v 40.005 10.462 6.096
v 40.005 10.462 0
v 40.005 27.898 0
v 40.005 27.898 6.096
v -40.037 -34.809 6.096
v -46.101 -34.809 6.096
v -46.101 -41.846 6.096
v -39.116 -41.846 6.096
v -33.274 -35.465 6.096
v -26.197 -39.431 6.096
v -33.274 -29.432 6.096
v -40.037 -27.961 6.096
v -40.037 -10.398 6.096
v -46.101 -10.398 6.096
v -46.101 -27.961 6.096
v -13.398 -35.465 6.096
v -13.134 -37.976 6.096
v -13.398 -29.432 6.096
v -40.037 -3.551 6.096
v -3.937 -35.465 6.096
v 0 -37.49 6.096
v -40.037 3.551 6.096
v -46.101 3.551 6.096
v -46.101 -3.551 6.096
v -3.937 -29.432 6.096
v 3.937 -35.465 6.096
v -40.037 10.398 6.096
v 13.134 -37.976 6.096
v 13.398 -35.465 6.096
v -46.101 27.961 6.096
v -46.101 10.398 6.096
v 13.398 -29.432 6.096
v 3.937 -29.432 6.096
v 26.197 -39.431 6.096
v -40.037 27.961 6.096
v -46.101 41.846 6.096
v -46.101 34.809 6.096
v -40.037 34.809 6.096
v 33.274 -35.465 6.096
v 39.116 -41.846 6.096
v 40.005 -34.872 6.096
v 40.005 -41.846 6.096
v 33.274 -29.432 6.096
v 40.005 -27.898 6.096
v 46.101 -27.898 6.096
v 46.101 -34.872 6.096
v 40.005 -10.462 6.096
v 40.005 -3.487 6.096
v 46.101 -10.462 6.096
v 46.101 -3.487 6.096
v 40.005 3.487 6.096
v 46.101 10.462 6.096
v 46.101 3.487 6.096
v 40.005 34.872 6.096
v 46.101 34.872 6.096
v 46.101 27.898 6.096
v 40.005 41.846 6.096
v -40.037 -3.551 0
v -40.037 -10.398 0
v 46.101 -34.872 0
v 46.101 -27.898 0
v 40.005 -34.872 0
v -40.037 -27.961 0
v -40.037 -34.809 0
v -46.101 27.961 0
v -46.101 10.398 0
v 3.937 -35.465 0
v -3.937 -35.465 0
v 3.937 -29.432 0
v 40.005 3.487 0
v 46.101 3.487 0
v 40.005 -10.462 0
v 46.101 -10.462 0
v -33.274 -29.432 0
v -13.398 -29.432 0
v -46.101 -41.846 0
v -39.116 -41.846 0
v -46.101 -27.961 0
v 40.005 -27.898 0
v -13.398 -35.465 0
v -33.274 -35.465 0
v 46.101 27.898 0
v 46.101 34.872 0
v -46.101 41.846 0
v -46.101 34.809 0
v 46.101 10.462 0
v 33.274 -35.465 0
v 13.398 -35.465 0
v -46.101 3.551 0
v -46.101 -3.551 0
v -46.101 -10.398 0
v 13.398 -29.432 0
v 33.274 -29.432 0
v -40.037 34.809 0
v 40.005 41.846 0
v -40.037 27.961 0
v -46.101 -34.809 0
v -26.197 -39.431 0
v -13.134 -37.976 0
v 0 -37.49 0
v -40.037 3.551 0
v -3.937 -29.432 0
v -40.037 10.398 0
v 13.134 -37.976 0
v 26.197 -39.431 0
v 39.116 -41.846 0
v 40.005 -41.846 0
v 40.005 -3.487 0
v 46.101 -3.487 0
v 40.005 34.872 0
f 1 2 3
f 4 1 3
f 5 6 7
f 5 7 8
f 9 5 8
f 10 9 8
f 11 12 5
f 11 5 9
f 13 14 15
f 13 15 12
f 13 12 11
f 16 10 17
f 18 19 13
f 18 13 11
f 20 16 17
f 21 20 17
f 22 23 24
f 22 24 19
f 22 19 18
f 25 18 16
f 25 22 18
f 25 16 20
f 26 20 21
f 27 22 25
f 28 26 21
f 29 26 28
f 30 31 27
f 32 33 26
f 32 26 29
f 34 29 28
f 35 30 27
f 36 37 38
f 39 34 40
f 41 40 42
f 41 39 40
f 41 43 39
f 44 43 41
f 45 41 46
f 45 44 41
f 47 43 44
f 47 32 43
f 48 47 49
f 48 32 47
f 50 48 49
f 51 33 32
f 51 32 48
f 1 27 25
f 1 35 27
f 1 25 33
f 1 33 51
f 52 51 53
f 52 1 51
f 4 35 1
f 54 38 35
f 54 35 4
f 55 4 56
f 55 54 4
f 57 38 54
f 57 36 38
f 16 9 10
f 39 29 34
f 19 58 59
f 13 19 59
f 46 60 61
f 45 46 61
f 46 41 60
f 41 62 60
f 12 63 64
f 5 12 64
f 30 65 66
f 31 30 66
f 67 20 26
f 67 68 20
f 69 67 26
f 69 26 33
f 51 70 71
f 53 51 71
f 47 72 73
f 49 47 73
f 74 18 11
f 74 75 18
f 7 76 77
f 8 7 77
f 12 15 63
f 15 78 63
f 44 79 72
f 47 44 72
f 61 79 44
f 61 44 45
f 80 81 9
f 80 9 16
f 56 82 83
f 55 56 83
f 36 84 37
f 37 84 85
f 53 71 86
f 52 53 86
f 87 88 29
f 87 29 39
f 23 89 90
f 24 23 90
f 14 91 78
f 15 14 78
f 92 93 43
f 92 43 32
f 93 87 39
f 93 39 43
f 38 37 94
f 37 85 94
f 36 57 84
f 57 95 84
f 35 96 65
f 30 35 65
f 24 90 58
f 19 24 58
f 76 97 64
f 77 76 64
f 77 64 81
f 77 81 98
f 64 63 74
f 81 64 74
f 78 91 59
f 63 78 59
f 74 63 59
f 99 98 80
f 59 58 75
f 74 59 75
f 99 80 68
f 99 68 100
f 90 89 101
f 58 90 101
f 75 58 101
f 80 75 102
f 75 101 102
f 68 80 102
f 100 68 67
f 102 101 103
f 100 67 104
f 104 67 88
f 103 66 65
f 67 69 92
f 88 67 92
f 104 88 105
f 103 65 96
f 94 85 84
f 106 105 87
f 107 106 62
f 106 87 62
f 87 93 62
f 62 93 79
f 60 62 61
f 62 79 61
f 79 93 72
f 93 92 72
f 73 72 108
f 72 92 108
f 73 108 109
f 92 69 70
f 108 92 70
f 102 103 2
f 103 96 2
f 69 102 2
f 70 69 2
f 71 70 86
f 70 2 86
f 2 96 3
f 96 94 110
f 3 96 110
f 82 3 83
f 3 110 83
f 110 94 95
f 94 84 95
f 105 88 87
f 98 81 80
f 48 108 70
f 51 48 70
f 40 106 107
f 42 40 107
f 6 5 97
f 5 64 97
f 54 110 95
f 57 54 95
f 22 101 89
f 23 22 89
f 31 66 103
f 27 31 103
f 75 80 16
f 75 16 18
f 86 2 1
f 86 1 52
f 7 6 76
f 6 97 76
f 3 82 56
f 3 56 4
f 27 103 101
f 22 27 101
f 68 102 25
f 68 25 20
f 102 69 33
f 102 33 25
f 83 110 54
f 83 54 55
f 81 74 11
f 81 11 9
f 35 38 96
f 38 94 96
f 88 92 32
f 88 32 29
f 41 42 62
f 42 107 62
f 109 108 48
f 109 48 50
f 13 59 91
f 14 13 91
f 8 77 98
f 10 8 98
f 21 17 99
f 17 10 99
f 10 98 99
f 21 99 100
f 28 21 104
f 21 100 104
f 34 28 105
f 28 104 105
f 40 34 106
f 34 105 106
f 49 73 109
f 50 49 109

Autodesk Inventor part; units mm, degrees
ref_plane "YZ Plane" through (0, 0, 0) normal (1, 0, 0) x (0, 1, 0)
ref_plane "XZ Plane" through (0, 0, 0) normal (0, 1, 0) x (-1, 0, 0)
ref_plane "XY Plane" through (0, 0, 0) normal (0, 0, 1) x (1, 0, 0)
sketch "Sketch1" plane through (0, 0, 0) normal (0, 0, 1) x (1, 0, 0)
  line L0 (-46.101, -41.8465) -> (-39.116, -41.8465)
  line L1 (46.101, -41.8465) -> (46.101, -34.8721)
  line L2 (46.101, 41.8465) -> (-46.101, 41.8465)
  line L3 (-46.101, 41.8465) -> (-46.101, 34.8721)
  line L4 (-46.101, -41.8465) -> (46.101, 41.8465) construction
  line L5 (46.101, -41.8465) -> (-46.101, 41.8465) construction
  line L6 (-40.005, 41.8465) -> (-40.005, 34.8721) construction
  line L7 (40.005, -41.8465) -> (40.005, -34.8721)
  line L8 (-40.005, -29.4005) -> (-33.3375, -29.4005) construction
  line L9 (-40.005, -35.4965) -> (-33.3375, -35.4965) construction
  line L10 (-33.3375, -29.4005) -> (-33.3375, -35.4965) construction
  line L11 (-13.335, -29.4005) -> (-13.335, -35.4965) construction
  line L12 (-33.3375, -29.4005) -> (-13.335, -29.4005) construction
  line L13 (-13.335, -29.4005) -> (-4.0005, -29.4005) construction
  line L14 (-13.335, -35.4965) -> (-4.0005, -35.4965) construction
  line L15 (-33.3375, -35.4965) -> (-13.335, -35.4965) construction
  line L16 (-64.5414, 0) -> (64.5414, 0) construction
  line L17 (-46.101, 34.8721) -> (-40.005, 34.8721) construction
  line L18 (-46.101, 27.8977) -> (-40.005, 27.8977) construction
  line L19 (40.005, 34.8721) -> (46.101, 34.8721)
  line L20 (-46.101, 34.8721) -> (-46.101, 34.8086)
  line L21 (-46.101, 27.8977) -> (-46.101, 10.3981)
  line L22 (-40.005, 34.8721) -> (-40.005, 27.8977) construction
  line L23 (-40.005, 27.8977) -> (-40.005, 10.4616) construction
  line L24 (46.101, 34.8721) -> (46.101, 41.8465)
  line L25 (40.005, 34.8721) -> (40.005, 41.8465)
  line L26 (-33.274, -35.4648) -> (-13.3985, -35.4648)
  line L27 (-13.3985, -35.4648) -> (-13.3985, -29.4323)
  line L28 (-13.3985, -29.4323) -> (-33.274, -29.4323)
  line L29 (-33.274, -29.4323) -> (-33.274, -35.4648)
  line L30 (-33.274, -35.4648) -> (-13.3985, -29.4323) construction
  line L31 (-13.3985, -35.4648) -> (-33.274, -29.4323) construction
  line L32 (-23.3362, -32.4485) -> (-23.3362, -29.4005) construction
  line L33 (-23.3362, -32.4485) -> (-13.335, -32.4485) construction
  line L34 (-46.101, 34.8086) -> (-40.0367, 34.8086)
  line L35 (-40.0367, 34.8086) -> (-40.0367, 27.9612)
  line L36 (-40.0367, 27.9612) -> (-46.101, 27.9612)
  line L37 (-40.0367, 31.3849) -> (-40.005, 31.3849) construction
  line L38 (-46.101, 34.8086) -> (-46.101, 27.9612)
  line L39 (-46.101, 27.9612) -> (-46.101, 27.8977)
  arc A0 (39.116, -41.8465) -> (-39.116, -41.8465) centre (0, -215.2904) ccw
  line L40 (0, 93.2739) -> (0, -266.7178) construction
  line L41 (-39.116, -41.8465) -> (39.116, -41.8465)
  line L42 (39.116, -41.8465) -> (40.005, -41.8465)
  line L43 (-4.0005, -29.4005) -> (-4.0005, -35.4965) construction
  line L44 (4.0005, -29.4005) -> (4.0005, -35.4965) construction
  line L45 (13.335, -29.4005) -> (13.335, -35.4965) construction
  line L46 (33.3375, -29.4005) -> (33.3375, -35.4965) construction
  line L47 (-3.937, -35.4648) -> (3.937, -35.4648)
  line L48 (3.937, -35.4648) -> (3.937, -29.4323)
  line L49 (3.937, -29.4323) -> (-3.937, -29.4323)
  line L50 (-3.937, -29.4323) -> (-3.937, -35.4648)
  line L51 (-3.937, -35.4648) -> (3.937, -29.4323) construction
  line L52 (3.937, -35.4648) -> (-3.937, -29.4323) construction
  line L53 (13.3985, -35.4648) -> (33.274, -35.4648)
  line L54 (33.274, -35.4648) -> (33.274, -29.4323)
  line L55 (33.274, -29.4323) -> (13.3985, -29.4323)
  line L56 (13.3985, -29.4323) -> (13.3985, -35.4648)
  line L57 (13.3985, -35.4648) -> (33.274, -29.4323) construction
  line L58 (33.274, -35.4648) -> (13.3985, -29.4323) construction
  line L59 (-4.0005, -35.4965) -> (4.0005, -35.4965) construction
  line L60 (4.0005, -35.4965) -> (13.335, -35.4965) construction
  line L61 (4.0005, -29.4005) -> (13.335, -29.4005) construction
  line L62 (-4.0005, -29.4005) -> (4.0005, -29.4005) construction
  line L63 (13.335, -29.4005) -> (33.3375, -29.4005) construction
  line L64 (33.3375, -29.4005) -> (40.005, -29.4005) construction
  line L65 (33.3375, -35.4965) -> (40.005, -35.4965) construction
  line L66 (13.335, -35.4965) -> (33.3375, -35.4965) construction
  line L67 (23.3362, -29.4005) -> (23.3362, -32.4485) construction
  line L68 (-46.101, 10.4616) -> (-40.005, 10.4616) construction
  line L69 (-46.101, 3.4872) -> (-40.005, 3.4872) construction
  line L70 (-46.101, -3.4872) -> (-40.005, -3.4872) construction
  line L71 (-46.101, -10.4616) -> (-40.005, -10.4616) construction
  line L72 (-46.101, -27.8977) -> (-40.005, -27.8977) construction
  line L73 (-46.101, -34.8721) -> (-40.005, -34.8721) construction
  line L74 (-46.101, 10.3981) -> (-40.0367, 10.3981)
  line L75 (-40.0367, 10.3981) -> (-40.0367, 3.5507)
  line L76 (-40.0367, 3.5507) -> (-46.101, 3.5507)
  line L77 (-46.101, -3.5507) -> (-40.0367, -3.5507)
  line L78 (-40.0367, -3.5507) -> (-40.0367, -10.3981)
  line L79 (-40.0367, -10.3981) -> (-46.101, -10.3981)
  line L80 (-46.101, -27.9612) -> (-40.0367, -27.9612)
  line L81 (-40.0367, -27.9612) -> (-40.0367, -34.8086)
  line L82 (-40.0367, -34.8086) -> (-46.101, -34.8086)
  line L83 (-40.005, 10.4616) -> (-40.005, 3.4872) construction
  line L84 (-40.005, 3.4872) -> (-40.005, -3.4872) construction
  line L85 (-40.005, -3.4872) -> (-40.005, -10.4616) construction
  line L86 (-40.005, -10.4616) -> (-40.005, -27.8977) construction
  line L87 (-40.005, -34.8721) -> (-40.005, -41.8465) construction
  line L88 (-40.005, -27.8977) -> (-40.005, -34.8721) construction
  line L89 (-40.0367, -31.3849) -> (-40.005, -31.3849) construction
  line L90 (-40.0367, -6.9744) -> (-40.005, -6.9744) construction
  line L91 (-40.0367, 6.9744) -> (-40.005, 6.9744) construction
  line L92 (-46.101, 10.3981) -> (-46.101, 3.5507)
  line L93 (-46.101, 3.5507) -> (-46.101, -3.5507)
  line L94 (-46.101, -10.3981) -> (-46.101, -27.9612)
  line L95 (-46.101, -3.5507) -> (-46.101, -10.3981)
  line L96 (-46.101, -34.8086) -> (-46.101, -41.8465)
  line L97 (-46.101, -27.9612) -> (-46.101, -34.8086)
  line L98 (46.101, 27.8977) -> (40.005, 27.8977)
  line L99 (40.005, 3.4872) -> (46.101, 3.4872)
  line L100 (40.005, -3.4872) -> (46.101, -3.4872)
  line L101 (40.005, -10.4616) -> (46.101, -10.4616)
  line L102 (40.005, -27.8977) -> (46.101, -27.8977)
  line L103 (40.005, 10.4616) -> (46.101, 10.4616)
  line L104 (40.005, -34.8721) -> (46.101, -34.8721)
  line L105 (40.005, -27.8977) -> (40.005, -10.4616)
  line L106 (40.005, -34.8721) -> (40.005, -27.8977) construction
  line L107 (40.005, -10.4616) -> (40.005, -3.4872) construction
  line L108 (40.005, -3.4872) -> (40.005, 3.4872)
  line L109 (40.005, 3.4872) -> (40.005, 10.4616) construction
  line L110 (40.005, 10.4616) -> (40.005, 27.8977)
  line L111 (40.005, 27.8977) -> (40.005, 34.8721) construction
  line L112 (40.005, -41.8465) -> (46.101, -41.8465)
  line L113 (46.101, -34.8721) -> (46.101, -27.8977)
  line L114 (46.101, -27.8977) -> (46.101, -10.4616)
  line L115 (46.101, -10.4616) -> (46.101, -3.4872)
  line L116 (46.101, -3.4872) -> (46.101, 3.4872)
  line L117 (46.101, 3.4872) -> (46.101, 10.4616)
  line L118 (46.101, 10.4616) -> (46.101, 27.8977)
  line L119 (46.101, 27.8977) -> (46.101, 34.8721)
  point P0 (0, 0)
  point P1 (0, -32.4485)
  dimension "d1" = 6.096
  dimension "d3" = 6.096
  dimension "d4" = 6.35
  dimension "d5" = 20.0025
  dimension "d6" = 13.335
  dimension "d9" = 83.693
  dimension "d10" = 6.9744
  dimension "d11" = 71.247
  dimension "d12" = 6.9744
  dimension "d32" = 6.0325
  dimension "d33" = 19.8755
  dimension "d34" = 6.8474
  dimension "d36" = 6.0643
  dimension "d38" = 6.985
  dimension "d39" = 177.8
  dimension "d40" = 8.001
  dimension "d41" = 4.0005
  dimension "d42" = 20.0025
  dimension "d43" = 7.874
  dimension "d44" = 19.8755
  dimension "d45" = 13.335
  dimension "d46" = 6.9744
  dimension "d47" = 6.9744
  dimension "d48" = 6.8474
  dimension "d49" = 6.8474
  dimension "d50" = 6.8474
  dimension "d51" = 80.01
  dimension "d52" = 6.096
extrude "Extrusion1" add sketch "Sketch1" along normal blind 6.096 contours L96 L82 L81 L80 L94 L79 L78 L77 L93 L76 L75 L74 L21 L39 L36 L35 L34 L20 L3 L2 L25 L19 L119 L98 L110 L103 L117 L99 L108 L100 L115 L101 L105 L102 L113 L104 L7 L42 A0 L0 | L38 L34 L35 L36 | L19 L25 L2 L24 | L29 L28 L27 L26 | L50 L49 L48 L47 | L56 L55 L54 L53
extrude "Extrusion2" cut sketch "Sketch1" along normal blind 6.096 contours L19 L25 L2 L24
extrude "Extrusion3" cut sketch "Sketch1" along normal blind 6.096 contours L38 L34 L35 L36
extrude "Extrusion4" cut sketch "Sketch1" along normal blind 6.096 contours L29 L28 L27 L26 | L50 L49 L48 L47 | L56 L55 L54 L53
fillet "Fillet1" [suppressed]
fillet "Fillet2" [suppressed]
equation "\"d1\" = woodThickness"
equation "\"d3\" = woodThickness"
equation "\"d5\" = toothLength"
equation "\"d6\" = toothOffset"
equation "\"d10\" = 0.0833333 * d9"
equation "\"d11\" = glassHeight - lip"
equation "\"d12\" = d10"
equation "\"d32\" = d1 - lasorTol"
equation "\"d33\" = d5 - 2 * lasorTol"
equation "\"d34\" = d12 - 2 * lasorTol"
equation "\"d36\" = d3 - 0.5 * lasorTol"
equation "\"d40\" = 0.4 * toothLength"
equation "\"d41\" = 0.5 * d40"
equation "\"d42\" = d5"
equation "\"d43\" = d40 - 2 * lasorTol"
equation "\"d44\" = d42 - 2 * lasorTol"
equation "\"d45\" = d6"
equation "\"d46\" = d12"
equation "\"d47\" = d10"
equation "\"d48\" = d34"
equation "\"d49\" = d34"
equation "\"d50\" = d34"
equation "\"d51\" = baseLength"
equation "\"d52\" = woodThickness"
equation "\"d13\" = woodThickness"
equation "\"d15\" = woodThickness"
equation "\"d17\" = woodThickness"
equation "\"d19\" = woodThickness"
equation "\"woodThickness\" = 6.096"
equation "\"toothLength\" = 20.0025"
equation "\"glassHeight\" = 80.772"
equation "\"lip\" = 9.525"
equation "\"lasorTol\" = 0.0635"
equation "\"baseLength\" = 80.01"
equation "\"toothOffset\" = 13.335"
properties part number "CandleHolder-2" material "Wood (Birch)"
